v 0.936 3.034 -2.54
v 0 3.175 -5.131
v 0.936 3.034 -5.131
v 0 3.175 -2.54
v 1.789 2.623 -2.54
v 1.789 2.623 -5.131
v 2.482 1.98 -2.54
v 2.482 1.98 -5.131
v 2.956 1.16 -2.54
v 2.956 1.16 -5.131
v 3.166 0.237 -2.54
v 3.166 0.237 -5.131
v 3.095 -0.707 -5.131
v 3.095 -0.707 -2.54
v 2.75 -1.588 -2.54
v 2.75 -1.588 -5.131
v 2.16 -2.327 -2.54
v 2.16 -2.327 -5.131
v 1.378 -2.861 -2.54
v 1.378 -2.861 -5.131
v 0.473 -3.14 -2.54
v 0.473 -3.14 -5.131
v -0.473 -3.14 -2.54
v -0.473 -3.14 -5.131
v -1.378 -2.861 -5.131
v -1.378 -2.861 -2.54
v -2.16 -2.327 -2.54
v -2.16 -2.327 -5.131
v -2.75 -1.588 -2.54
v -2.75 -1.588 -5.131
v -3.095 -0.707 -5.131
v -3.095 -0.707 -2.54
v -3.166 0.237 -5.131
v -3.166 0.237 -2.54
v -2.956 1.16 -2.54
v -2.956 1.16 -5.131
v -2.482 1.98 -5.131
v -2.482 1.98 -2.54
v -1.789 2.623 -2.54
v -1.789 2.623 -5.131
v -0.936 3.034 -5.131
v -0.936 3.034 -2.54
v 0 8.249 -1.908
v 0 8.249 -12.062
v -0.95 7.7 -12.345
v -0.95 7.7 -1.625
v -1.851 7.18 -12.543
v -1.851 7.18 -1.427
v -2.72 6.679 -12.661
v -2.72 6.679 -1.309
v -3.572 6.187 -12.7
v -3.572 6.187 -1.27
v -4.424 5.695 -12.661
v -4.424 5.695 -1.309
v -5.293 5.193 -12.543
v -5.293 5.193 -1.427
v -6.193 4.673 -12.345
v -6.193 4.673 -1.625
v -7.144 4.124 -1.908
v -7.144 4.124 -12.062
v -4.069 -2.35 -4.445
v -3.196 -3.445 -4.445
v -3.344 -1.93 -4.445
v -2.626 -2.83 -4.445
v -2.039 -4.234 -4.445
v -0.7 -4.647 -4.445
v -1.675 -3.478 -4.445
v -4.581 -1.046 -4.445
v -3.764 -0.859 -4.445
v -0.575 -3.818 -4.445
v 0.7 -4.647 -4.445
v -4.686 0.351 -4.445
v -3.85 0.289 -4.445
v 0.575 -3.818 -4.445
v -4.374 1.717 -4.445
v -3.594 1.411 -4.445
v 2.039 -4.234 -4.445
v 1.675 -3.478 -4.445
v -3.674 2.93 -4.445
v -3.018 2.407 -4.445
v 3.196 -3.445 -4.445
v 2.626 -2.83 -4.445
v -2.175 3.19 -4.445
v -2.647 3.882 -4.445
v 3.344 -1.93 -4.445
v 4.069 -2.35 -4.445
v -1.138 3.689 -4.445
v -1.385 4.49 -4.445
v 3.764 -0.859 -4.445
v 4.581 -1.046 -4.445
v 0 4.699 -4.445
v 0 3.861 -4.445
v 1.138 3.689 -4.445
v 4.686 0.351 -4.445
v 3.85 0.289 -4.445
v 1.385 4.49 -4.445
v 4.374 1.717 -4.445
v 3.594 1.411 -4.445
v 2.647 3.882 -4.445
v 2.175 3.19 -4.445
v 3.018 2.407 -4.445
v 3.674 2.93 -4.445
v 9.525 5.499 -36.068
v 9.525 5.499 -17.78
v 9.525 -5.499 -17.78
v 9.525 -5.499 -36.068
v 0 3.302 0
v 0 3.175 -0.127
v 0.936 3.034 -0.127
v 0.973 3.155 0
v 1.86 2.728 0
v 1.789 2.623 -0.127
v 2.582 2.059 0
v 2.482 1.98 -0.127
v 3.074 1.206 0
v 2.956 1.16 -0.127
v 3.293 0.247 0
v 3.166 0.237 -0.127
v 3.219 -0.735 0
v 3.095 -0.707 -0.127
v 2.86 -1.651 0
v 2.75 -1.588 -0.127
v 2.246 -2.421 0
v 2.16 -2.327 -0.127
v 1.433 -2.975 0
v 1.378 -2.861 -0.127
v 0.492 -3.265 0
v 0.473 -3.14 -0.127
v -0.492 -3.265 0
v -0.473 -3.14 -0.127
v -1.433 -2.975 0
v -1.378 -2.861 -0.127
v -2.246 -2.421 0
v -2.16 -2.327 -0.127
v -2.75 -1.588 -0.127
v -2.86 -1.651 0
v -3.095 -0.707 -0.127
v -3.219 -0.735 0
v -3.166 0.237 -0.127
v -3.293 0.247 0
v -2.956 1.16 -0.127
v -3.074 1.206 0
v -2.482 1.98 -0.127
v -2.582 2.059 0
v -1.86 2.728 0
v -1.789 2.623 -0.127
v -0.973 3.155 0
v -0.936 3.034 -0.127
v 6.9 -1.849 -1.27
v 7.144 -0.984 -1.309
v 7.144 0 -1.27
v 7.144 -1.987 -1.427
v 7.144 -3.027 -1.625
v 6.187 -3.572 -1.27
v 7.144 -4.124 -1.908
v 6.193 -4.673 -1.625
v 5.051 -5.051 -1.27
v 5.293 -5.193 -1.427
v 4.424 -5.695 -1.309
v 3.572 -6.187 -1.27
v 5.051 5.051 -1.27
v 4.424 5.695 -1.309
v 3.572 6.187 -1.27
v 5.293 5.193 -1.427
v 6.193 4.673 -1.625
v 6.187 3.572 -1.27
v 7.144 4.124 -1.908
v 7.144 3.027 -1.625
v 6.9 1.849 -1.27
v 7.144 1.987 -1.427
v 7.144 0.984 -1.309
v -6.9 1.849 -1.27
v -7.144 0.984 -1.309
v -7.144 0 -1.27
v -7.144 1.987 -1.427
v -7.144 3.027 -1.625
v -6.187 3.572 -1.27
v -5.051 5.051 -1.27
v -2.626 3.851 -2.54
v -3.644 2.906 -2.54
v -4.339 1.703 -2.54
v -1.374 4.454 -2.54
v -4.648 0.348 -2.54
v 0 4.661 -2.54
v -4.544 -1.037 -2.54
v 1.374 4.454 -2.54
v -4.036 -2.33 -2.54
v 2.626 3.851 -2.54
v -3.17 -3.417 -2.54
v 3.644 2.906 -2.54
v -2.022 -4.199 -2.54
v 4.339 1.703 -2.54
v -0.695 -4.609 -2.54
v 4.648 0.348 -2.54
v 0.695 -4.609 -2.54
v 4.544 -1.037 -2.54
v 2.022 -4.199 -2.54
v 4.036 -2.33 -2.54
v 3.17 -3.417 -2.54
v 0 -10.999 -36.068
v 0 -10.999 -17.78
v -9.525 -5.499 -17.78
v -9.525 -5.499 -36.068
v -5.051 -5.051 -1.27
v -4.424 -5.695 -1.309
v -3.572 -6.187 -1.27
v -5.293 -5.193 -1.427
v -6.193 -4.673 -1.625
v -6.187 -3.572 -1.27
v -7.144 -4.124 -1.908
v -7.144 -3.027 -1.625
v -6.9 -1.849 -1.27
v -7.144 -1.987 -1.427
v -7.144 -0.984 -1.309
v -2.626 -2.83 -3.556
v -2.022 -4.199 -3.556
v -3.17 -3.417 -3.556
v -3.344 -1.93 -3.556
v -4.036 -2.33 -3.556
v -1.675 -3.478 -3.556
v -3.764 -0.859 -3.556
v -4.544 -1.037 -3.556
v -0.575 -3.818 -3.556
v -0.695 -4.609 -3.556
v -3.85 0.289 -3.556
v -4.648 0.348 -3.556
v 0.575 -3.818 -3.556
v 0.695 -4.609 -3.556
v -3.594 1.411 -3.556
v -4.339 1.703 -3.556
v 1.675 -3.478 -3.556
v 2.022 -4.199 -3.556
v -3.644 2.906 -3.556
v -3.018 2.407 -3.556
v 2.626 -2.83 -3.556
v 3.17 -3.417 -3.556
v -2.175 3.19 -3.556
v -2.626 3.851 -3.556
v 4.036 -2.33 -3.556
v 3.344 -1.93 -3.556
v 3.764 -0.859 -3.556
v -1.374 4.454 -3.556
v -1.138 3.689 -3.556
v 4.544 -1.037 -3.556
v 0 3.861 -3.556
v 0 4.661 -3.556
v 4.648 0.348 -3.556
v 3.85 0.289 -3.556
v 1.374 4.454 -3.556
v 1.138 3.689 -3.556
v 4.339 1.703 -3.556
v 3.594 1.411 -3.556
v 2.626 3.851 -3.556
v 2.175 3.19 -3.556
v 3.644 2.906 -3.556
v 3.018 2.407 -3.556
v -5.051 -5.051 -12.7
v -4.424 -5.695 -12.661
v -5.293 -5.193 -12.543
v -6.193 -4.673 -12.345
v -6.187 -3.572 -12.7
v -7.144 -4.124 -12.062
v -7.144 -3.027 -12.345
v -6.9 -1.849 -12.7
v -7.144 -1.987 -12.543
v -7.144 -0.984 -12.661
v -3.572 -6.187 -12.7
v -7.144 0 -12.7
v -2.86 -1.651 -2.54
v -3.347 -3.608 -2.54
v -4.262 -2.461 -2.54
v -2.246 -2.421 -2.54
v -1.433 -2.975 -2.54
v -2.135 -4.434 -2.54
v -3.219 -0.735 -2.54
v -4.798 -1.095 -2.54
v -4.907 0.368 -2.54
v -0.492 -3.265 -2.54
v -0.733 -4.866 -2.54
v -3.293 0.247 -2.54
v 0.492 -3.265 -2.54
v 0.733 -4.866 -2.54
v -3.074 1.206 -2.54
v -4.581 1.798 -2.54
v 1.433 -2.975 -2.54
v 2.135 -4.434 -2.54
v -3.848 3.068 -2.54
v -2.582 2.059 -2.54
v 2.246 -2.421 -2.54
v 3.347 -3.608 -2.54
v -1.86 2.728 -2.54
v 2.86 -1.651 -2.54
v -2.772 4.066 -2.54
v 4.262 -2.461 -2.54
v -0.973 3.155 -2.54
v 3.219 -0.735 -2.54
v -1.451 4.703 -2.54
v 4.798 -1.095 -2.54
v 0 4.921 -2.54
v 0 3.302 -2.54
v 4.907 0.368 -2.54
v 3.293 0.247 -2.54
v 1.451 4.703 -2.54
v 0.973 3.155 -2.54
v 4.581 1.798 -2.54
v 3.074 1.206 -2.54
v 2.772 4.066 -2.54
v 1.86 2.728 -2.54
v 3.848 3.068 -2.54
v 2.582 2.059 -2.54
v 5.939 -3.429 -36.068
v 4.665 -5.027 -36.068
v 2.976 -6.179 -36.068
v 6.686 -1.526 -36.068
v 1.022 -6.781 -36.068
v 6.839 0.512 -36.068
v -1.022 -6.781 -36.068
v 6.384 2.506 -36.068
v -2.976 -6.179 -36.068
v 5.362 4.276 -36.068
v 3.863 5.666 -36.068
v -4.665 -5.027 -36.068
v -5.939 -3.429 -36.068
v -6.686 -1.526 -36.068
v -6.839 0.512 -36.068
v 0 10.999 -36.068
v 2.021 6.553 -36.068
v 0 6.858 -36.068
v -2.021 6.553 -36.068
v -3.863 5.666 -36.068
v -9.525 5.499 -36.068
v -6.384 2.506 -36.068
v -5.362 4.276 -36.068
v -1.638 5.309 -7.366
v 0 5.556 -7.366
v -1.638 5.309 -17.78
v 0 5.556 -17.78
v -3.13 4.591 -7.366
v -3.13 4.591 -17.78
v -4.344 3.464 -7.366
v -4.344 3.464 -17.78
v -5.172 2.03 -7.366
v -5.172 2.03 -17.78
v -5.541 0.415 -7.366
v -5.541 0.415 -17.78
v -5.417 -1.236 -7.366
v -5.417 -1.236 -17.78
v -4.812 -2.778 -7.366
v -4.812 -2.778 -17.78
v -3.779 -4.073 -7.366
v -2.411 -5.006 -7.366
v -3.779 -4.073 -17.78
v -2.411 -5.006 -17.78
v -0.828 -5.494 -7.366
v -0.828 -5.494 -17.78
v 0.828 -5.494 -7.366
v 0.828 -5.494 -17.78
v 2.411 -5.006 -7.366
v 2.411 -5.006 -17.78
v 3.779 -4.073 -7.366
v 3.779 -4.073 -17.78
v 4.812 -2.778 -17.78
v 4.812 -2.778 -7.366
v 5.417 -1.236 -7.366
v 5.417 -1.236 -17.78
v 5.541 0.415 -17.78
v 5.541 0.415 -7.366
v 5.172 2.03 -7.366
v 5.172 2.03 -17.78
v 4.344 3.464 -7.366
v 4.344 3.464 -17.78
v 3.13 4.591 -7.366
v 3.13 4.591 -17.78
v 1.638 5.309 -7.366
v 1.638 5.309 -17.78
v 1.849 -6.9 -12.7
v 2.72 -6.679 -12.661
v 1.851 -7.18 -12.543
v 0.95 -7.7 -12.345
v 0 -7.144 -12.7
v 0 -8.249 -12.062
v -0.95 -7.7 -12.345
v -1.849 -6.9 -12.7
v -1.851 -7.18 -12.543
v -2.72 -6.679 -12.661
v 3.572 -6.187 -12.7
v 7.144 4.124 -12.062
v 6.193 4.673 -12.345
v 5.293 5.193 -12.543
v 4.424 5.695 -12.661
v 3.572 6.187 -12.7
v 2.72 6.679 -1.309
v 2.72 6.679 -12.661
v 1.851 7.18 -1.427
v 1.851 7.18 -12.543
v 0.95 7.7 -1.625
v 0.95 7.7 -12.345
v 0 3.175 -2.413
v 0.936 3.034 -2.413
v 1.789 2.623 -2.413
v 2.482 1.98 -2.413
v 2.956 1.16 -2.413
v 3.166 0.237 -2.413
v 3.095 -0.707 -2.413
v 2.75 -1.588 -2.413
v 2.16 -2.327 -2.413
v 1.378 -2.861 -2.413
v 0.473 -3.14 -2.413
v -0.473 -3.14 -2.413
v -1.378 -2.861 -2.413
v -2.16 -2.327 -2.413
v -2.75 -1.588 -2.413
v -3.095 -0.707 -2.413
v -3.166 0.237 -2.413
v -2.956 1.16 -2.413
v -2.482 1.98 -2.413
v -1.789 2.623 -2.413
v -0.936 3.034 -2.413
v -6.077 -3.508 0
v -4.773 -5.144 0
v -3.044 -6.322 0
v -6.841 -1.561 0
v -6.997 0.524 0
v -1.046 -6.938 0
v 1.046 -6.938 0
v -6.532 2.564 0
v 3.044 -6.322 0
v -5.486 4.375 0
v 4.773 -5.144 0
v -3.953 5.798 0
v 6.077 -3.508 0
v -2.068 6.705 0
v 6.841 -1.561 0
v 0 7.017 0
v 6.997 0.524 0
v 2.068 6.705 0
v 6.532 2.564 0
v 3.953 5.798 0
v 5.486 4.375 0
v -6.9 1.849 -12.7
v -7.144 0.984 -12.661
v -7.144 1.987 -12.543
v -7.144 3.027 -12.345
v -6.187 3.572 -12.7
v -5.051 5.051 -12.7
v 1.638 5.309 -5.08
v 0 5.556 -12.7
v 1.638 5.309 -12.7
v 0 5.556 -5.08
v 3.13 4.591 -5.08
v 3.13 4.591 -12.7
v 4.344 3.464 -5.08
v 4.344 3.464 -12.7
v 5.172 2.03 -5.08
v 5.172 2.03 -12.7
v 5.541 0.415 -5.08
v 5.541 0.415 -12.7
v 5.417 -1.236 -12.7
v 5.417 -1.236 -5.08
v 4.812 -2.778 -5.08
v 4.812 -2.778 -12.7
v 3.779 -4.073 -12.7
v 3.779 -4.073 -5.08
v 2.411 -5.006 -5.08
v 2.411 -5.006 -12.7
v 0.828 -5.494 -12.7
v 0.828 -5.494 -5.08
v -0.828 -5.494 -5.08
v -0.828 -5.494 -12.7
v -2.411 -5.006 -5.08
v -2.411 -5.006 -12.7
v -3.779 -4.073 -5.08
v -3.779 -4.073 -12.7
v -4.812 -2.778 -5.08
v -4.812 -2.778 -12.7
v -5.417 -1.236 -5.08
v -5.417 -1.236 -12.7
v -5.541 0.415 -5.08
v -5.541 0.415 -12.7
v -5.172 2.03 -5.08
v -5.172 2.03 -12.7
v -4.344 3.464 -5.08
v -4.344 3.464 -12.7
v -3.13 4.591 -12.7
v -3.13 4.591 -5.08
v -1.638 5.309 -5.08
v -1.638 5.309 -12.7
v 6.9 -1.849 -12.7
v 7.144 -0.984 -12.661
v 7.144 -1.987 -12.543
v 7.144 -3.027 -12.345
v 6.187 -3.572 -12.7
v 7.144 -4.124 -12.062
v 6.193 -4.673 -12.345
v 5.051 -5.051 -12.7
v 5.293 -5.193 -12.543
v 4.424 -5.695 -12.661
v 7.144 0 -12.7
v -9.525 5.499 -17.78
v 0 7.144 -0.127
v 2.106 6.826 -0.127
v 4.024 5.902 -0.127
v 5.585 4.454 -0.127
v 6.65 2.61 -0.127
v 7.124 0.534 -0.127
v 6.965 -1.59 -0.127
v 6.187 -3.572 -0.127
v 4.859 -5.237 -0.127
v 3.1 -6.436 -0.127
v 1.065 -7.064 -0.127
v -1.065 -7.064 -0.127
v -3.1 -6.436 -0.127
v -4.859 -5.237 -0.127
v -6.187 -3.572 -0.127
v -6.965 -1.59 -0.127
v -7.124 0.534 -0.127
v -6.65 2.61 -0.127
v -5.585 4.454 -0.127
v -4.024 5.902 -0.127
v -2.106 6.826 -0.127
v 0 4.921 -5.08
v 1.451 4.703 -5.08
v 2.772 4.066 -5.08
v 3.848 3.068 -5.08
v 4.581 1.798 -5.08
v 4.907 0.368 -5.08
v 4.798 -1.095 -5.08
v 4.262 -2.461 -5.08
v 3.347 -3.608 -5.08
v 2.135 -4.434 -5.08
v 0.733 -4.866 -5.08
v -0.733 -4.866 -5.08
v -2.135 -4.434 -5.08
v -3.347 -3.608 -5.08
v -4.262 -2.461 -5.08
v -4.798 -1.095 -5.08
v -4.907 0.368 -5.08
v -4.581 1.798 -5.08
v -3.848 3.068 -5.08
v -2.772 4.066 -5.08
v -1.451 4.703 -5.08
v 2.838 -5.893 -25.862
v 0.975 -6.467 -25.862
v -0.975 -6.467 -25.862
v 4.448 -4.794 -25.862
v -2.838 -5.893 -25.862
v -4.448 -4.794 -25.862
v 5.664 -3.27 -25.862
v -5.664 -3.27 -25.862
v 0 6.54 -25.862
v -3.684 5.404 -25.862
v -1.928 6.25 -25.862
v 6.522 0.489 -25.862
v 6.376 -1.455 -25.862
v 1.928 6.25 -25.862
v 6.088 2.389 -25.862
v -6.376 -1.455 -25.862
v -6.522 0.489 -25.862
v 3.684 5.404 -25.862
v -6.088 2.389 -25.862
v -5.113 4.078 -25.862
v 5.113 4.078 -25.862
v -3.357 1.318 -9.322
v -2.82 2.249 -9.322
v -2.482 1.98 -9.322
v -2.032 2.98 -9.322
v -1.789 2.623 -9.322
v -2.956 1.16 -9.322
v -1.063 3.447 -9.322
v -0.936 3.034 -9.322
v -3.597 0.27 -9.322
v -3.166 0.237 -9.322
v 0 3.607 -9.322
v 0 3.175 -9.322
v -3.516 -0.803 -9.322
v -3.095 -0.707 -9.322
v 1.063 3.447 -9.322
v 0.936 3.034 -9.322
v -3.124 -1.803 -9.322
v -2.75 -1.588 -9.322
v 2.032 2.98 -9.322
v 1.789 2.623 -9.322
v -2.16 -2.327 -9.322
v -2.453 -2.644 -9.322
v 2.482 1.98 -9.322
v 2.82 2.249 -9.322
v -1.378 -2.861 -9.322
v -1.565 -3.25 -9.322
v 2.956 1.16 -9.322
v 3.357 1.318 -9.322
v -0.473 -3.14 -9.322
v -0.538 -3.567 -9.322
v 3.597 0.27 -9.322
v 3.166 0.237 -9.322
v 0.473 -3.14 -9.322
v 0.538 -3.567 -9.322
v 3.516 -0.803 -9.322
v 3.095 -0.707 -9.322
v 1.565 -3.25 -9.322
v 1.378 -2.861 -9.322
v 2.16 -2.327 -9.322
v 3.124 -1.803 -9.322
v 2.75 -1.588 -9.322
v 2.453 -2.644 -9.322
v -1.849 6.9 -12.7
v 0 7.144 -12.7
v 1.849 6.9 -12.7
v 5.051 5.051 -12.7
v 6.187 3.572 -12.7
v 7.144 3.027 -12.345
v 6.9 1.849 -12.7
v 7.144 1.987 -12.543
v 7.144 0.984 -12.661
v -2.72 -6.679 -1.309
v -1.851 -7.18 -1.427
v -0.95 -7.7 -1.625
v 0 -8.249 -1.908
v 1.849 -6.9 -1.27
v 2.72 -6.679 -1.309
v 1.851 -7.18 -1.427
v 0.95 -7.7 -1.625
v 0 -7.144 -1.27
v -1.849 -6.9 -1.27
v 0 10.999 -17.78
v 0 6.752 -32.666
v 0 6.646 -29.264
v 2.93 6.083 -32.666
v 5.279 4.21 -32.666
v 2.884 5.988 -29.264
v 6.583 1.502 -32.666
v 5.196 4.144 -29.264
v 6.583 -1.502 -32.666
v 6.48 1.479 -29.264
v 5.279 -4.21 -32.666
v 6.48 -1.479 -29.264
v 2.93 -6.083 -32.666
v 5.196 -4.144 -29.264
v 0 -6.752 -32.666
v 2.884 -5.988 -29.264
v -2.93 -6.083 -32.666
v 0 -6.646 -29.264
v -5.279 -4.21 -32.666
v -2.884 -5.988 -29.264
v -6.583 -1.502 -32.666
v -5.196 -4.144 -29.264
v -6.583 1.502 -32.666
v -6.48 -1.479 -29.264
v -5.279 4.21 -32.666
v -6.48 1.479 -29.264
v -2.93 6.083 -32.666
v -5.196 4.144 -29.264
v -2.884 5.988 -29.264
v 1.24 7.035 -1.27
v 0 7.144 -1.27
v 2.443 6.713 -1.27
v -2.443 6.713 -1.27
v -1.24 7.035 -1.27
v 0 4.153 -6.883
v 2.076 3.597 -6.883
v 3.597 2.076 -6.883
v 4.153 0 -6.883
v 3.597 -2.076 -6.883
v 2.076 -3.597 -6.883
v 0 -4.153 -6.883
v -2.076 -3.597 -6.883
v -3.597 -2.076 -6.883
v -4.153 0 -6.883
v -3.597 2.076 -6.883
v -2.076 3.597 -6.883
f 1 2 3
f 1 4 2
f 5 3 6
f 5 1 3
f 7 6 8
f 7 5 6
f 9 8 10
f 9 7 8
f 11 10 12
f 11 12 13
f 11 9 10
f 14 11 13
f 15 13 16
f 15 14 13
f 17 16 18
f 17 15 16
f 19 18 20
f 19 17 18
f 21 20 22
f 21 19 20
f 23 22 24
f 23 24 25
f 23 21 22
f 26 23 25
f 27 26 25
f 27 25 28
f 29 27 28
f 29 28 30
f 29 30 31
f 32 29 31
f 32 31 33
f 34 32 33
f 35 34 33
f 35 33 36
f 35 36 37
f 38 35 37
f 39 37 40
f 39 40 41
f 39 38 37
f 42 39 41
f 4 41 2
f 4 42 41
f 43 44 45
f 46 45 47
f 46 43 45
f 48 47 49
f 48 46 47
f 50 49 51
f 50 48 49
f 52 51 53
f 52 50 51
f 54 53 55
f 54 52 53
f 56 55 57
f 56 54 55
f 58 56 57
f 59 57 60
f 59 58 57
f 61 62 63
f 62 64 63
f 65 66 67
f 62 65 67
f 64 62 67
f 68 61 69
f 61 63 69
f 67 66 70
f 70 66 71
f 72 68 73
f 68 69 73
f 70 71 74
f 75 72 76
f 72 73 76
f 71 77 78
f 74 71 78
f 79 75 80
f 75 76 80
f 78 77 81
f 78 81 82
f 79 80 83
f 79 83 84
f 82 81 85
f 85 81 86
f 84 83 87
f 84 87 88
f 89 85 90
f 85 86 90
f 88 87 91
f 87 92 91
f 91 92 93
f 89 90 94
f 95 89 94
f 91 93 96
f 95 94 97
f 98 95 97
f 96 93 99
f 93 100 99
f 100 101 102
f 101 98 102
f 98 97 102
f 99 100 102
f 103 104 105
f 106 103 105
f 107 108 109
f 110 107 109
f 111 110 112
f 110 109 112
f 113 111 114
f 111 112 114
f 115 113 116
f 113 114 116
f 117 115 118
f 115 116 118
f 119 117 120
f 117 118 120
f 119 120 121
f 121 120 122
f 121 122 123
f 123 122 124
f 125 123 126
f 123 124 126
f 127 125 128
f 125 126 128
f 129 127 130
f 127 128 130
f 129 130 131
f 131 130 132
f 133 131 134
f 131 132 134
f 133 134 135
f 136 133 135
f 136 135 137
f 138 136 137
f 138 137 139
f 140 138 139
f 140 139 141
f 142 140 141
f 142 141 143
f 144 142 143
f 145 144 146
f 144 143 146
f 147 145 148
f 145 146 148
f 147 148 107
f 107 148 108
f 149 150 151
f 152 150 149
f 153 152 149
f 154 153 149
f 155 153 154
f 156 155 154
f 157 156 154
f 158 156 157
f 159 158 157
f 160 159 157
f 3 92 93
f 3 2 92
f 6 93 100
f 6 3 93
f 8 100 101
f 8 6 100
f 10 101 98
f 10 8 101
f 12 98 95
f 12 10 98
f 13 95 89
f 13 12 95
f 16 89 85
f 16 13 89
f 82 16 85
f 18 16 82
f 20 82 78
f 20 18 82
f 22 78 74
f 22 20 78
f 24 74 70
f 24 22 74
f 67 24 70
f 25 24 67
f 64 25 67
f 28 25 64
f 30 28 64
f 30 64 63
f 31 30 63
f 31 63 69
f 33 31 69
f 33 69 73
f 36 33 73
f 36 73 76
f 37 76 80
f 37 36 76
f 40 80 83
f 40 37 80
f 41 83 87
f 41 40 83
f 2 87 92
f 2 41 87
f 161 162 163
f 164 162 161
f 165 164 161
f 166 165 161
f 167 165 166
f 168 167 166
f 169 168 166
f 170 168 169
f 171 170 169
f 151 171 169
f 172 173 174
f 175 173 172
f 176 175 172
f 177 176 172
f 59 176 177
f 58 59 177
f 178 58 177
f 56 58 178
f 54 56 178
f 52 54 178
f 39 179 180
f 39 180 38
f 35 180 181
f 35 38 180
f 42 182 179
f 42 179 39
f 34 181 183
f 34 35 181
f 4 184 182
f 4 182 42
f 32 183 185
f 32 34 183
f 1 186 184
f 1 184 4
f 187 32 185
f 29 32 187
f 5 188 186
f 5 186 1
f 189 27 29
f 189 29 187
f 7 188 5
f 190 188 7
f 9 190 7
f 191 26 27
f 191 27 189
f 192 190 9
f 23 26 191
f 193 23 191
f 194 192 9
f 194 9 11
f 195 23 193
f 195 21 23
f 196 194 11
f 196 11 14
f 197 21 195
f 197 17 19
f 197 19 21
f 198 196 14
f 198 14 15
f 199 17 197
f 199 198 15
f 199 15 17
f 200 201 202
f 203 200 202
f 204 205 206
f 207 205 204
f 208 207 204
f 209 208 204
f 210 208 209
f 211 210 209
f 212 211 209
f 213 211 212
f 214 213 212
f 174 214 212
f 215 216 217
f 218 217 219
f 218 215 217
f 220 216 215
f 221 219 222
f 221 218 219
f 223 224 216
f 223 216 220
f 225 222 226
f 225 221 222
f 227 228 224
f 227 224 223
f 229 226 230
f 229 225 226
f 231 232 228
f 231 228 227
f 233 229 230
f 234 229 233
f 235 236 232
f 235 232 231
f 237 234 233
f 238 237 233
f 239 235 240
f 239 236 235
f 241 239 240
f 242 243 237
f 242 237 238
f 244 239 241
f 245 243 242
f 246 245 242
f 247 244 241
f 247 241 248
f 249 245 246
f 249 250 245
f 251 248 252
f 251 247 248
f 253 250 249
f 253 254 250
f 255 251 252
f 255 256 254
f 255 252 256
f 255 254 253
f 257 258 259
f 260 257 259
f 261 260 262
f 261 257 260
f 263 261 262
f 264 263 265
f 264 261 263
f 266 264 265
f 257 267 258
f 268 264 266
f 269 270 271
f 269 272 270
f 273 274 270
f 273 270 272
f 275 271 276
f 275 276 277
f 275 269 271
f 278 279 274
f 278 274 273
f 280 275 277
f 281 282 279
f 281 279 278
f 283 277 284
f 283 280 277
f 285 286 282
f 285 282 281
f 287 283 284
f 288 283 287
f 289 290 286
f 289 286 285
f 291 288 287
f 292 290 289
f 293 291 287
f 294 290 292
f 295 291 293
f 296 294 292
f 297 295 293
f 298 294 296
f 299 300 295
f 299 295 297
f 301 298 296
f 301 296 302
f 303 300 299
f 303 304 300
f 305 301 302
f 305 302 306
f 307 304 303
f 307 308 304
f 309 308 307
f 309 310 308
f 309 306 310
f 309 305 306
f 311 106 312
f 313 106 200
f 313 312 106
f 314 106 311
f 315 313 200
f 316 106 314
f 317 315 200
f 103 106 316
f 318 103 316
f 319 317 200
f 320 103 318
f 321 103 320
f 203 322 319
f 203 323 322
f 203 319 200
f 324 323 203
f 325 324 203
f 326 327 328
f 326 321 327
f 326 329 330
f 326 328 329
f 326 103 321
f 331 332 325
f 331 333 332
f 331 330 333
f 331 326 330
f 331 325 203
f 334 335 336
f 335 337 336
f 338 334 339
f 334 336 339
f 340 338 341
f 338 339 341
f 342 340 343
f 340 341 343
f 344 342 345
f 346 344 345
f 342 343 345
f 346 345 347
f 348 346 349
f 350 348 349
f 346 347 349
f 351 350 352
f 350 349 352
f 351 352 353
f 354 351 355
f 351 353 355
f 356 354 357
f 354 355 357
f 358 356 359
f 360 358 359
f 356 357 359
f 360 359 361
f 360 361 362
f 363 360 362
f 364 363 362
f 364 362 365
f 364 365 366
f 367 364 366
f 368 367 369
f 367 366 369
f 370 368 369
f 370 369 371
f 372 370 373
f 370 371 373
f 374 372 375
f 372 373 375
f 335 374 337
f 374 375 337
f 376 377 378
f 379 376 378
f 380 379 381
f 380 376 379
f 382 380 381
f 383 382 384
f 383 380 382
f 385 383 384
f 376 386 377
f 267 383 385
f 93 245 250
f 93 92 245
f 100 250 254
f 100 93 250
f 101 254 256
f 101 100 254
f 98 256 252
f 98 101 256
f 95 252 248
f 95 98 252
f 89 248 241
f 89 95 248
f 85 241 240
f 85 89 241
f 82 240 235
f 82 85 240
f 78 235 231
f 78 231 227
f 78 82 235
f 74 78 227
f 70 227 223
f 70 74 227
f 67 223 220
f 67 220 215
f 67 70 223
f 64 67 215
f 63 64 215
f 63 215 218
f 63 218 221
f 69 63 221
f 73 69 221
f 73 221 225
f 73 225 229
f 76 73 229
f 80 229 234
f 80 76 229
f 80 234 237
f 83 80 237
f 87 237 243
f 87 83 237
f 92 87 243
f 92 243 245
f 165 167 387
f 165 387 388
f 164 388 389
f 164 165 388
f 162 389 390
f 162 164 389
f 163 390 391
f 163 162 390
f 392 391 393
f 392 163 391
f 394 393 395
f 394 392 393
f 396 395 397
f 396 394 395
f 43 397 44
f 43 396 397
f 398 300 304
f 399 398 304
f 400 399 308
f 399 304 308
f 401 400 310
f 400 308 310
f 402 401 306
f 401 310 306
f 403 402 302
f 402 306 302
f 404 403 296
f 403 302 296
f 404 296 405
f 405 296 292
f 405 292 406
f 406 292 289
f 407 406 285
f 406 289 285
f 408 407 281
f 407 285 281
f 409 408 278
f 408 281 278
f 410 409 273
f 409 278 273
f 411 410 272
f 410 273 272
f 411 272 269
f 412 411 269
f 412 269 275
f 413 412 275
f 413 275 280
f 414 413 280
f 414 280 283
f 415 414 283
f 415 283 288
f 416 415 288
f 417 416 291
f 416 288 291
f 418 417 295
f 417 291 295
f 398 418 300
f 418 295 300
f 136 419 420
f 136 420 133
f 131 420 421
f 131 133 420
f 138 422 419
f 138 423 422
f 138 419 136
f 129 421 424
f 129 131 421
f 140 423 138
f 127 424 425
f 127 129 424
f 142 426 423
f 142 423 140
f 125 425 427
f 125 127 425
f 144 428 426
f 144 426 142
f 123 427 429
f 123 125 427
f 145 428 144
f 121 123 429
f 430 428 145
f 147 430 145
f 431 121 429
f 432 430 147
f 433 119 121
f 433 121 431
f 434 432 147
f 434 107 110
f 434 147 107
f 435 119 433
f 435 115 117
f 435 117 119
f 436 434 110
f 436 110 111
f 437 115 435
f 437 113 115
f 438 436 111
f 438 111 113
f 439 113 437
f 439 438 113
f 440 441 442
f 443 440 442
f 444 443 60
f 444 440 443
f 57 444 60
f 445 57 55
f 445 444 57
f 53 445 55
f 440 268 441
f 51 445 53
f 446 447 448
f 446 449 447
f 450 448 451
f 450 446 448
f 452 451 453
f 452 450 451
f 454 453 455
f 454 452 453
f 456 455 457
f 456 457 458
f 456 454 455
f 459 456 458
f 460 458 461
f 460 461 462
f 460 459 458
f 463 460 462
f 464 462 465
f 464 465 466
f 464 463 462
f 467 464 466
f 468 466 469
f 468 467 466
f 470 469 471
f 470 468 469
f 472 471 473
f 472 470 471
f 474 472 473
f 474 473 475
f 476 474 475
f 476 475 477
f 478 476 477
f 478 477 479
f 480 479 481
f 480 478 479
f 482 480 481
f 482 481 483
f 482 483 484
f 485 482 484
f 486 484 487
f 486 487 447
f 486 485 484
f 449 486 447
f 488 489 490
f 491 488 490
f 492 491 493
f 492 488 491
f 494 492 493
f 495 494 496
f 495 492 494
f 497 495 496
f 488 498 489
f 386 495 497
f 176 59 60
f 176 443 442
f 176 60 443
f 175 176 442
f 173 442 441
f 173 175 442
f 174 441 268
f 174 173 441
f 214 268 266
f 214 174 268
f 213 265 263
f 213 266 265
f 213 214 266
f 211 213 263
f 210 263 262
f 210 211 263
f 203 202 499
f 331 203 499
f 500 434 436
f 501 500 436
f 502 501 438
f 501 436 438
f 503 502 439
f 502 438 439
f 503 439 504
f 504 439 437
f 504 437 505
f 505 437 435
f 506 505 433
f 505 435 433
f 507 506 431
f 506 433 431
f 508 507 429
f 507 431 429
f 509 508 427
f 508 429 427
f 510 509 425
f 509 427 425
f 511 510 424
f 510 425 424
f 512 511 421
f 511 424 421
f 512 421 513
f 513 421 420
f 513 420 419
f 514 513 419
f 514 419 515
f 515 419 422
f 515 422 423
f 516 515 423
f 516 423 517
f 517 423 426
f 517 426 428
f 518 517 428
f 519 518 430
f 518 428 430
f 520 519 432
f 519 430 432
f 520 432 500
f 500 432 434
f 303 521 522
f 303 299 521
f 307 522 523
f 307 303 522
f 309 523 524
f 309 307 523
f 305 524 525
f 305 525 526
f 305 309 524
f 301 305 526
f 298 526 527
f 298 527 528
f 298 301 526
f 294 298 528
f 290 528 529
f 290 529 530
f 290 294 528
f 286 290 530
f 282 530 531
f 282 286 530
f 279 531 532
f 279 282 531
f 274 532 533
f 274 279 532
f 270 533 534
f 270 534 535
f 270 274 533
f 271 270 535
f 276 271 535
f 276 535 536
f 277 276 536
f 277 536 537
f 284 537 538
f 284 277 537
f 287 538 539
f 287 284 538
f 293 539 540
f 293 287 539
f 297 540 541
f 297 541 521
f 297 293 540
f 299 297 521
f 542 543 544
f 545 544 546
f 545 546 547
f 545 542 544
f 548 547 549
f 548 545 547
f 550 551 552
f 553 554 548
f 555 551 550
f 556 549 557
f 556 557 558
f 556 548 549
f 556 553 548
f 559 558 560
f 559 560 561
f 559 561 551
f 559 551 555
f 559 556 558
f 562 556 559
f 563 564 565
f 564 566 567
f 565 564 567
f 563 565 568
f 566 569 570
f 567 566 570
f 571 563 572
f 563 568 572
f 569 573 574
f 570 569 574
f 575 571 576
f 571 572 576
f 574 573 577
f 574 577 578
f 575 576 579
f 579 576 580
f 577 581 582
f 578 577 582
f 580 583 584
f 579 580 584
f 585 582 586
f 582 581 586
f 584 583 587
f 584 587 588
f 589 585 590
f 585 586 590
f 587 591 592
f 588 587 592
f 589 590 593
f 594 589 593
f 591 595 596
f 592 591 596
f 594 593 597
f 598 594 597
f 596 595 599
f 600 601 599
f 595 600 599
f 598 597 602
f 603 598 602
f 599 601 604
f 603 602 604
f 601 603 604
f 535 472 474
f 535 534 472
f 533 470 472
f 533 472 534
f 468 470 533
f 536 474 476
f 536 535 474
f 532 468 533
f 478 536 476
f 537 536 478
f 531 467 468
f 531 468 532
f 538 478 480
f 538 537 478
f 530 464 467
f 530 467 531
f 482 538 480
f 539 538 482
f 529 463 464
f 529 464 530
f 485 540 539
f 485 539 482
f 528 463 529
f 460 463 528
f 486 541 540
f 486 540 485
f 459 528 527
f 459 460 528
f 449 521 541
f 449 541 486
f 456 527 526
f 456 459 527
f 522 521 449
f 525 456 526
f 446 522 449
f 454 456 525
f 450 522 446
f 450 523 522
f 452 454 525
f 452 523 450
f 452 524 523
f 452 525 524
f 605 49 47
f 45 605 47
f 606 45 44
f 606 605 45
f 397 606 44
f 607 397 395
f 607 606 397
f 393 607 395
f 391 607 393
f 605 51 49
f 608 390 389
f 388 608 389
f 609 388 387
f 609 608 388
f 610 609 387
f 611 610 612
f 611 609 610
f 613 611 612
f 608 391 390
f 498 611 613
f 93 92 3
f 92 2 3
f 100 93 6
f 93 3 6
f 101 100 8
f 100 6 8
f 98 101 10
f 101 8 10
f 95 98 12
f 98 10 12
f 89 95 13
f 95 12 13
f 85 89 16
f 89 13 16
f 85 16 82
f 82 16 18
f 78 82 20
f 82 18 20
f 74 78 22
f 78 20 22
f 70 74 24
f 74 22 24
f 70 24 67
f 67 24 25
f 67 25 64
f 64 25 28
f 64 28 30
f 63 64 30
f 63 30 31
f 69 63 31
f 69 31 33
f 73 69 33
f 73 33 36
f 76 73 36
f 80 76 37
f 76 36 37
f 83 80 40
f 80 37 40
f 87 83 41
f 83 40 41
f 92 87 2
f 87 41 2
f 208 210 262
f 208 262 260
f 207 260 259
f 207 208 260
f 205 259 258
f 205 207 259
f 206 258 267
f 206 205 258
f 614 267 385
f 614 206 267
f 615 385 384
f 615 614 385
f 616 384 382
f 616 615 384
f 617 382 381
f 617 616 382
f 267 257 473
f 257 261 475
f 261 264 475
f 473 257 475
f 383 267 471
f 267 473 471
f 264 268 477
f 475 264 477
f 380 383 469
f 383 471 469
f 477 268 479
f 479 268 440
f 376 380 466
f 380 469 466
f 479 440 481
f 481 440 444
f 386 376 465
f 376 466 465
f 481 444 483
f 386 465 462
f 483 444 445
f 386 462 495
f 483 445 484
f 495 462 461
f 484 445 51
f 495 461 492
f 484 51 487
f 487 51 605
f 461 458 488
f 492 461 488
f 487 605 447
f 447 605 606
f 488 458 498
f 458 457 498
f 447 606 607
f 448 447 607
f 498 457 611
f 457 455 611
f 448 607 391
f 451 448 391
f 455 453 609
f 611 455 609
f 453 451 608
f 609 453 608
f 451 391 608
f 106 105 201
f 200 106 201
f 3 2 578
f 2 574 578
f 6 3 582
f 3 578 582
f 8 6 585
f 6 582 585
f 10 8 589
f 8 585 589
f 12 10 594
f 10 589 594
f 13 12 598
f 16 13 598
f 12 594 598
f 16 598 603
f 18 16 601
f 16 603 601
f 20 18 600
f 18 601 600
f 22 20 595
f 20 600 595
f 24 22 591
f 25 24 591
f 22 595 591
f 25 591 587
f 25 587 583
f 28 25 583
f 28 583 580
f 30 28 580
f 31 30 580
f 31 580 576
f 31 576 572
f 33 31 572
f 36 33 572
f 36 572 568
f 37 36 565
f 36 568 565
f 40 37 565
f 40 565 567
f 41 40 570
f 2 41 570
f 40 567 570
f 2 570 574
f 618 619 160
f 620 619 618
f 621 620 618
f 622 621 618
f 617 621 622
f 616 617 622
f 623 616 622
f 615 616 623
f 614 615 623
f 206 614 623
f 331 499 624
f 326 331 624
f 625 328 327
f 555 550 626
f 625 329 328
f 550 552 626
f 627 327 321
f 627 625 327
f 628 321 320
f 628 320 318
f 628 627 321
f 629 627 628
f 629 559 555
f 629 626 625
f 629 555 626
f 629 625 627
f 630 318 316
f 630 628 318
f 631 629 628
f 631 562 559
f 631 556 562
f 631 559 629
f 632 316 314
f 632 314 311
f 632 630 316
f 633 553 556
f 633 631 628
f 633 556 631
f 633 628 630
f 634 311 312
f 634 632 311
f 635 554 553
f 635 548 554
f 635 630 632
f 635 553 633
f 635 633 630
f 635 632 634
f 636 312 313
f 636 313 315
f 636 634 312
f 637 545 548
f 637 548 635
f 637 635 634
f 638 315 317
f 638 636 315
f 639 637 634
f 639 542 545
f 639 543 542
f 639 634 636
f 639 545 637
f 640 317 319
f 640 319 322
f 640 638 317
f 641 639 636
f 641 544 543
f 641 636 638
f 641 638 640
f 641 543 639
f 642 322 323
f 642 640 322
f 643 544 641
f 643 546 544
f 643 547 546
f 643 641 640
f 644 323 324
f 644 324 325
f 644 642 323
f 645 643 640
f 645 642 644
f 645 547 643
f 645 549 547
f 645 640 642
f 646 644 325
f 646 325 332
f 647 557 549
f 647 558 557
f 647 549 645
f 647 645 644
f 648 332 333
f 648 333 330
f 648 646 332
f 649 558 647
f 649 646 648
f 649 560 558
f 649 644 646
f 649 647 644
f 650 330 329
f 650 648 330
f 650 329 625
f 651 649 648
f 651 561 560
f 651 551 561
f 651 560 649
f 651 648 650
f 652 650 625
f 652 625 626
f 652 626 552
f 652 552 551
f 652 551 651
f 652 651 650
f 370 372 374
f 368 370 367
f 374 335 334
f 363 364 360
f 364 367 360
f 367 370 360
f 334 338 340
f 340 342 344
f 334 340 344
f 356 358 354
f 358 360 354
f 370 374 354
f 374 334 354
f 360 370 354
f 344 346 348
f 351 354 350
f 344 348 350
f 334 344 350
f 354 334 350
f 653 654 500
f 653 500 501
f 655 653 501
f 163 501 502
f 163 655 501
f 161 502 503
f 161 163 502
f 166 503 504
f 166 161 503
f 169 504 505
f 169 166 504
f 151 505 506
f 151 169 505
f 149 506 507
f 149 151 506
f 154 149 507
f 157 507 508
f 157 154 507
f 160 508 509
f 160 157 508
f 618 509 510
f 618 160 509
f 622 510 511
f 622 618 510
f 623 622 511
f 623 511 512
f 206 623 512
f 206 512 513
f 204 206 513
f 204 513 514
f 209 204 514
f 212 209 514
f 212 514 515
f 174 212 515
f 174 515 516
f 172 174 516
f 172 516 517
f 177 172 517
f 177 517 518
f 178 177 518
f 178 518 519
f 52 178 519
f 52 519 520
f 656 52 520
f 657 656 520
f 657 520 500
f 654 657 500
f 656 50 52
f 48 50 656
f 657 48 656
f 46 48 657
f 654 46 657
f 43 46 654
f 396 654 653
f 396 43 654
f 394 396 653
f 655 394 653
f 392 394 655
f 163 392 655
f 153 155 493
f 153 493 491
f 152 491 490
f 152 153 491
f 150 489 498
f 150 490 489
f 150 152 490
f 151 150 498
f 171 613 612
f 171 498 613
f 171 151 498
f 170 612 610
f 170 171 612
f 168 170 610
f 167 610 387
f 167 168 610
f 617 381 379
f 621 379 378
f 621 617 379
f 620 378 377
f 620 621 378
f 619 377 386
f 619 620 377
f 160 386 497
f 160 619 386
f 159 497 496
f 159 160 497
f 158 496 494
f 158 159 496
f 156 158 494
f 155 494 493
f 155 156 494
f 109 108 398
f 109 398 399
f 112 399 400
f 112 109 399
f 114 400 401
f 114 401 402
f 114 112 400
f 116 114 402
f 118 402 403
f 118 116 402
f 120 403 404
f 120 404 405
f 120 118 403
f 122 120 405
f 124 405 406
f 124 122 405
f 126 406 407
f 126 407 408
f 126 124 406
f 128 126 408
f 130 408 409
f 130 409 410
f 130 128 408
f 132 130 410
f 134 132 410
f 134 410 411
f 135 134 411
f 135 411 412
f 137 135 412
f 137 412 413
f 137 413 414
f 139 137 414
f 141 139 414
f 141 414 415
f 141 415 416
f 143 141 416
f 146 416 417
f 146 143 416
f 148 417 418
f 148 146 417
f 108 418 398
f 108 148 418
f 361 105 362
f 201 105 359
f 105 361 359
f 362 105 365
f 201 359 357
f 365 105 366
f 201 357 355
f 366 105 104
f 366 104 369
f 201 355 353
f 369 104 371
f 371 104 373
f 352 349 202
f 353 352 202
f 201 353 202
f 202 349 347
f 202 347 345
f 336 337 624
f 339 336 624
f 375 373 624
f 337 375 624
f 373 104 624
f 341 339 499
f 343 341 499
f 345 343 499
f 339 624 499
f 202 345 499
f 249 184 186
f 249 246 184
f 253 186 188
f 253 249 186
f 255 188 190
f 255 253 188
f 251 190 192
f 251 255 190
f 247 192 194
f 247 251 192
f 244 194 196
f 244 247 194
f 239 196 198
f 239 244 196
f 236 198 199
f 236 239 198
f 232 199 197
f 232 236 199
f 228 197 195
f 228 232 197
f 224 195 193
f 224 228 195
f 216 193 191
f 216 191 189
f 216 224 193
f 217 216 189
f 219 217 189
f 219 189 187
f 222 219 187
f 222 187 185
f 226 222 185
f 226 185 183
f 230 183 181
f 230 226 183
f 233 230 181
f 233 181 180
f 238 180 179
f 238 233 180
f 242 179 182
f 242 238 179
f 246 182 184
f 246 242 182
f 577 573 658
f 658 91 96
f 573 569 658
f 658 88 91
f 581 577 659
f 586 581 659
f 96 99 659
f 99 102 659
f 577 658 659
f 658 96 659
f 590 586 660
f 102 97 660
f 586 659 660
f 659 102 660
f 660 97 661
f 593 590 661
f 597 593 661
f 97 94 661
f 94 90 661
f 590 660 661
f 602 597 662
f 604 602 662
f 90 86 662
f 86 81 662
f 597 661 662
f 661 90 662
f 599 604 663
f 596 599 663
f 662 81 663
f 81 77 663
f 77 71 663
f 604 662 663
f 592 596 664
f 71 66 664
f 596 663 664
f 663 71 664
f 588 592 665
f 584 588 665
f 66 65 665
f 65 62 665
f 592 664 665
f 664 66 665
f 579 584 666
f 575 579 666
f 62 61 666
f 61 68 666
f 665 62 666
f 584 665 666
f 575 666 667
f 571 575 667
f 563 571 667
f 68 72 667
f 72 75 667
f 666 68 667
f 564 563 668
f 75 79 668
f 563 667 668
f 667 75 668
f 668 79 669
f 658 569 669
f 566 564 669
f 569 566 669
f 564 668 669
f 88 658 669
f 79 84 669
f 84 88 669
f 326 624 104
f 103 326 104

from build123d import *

# Parameters (mm, degrees)
BOSS_EXTRUDE1_DEPTH = 12.7
CHAMFER1_SIZE       = 0.127
SKETCH4_W           = 10.414
SKETCH4_H           = 5.55625
BOSS_EXTRUDE2_DEPTH = 18.288


with BuildPart() as part:
    # Sketch2 → Boss-Extrude1 (new body)
    with BuildSketch(Plane.XY):
        Polygon((0, 8.248891971), (-7.14375, 4.124445986), (-7.14375, -4.124445986), (0, -8.248891971), (7.14375, -4.124445986), (7.14375, 4.124445986), align=None)
    extrude(amount=-BOSS_EXTRUDE1_DEPTH)

    # Sketch3 → Cut-Revolve1 (revolve, cut)
    with BuildSketch(Plane(origin=(0, 0, 0), x_dir=(0, 0, -1), z_dir=(1, 0, 0))):
        Polygon((0, 8.248891971), (0, 7.14375), (1.27, 7.14375), (1.908054014, 8.248891971), (12.061945986, 8.248891971), (12.7, 7.14375), (12.7, 8.248891971), (12.7, 9.354033942), (0, 9.354033942), align=None)
        Polygon((0, 3.175), (0, 0), (12.7, 0), (12.7, 5.55625), (5.08, 5.55625), (5.08, 4.92125), (2.54, 4.92125), (2.54, 4.28625), (2.54, 3.175), align=None)
    revolve(axis=Axis((0, 0, 0), (0, 0, -1)), mode=Mode.SUBTRACT)

    # Chamfer1
    chamfer1_edges = [part.edges().sort_by_distance(p)[0] for p in [
        (0, -7.14375, 0),
        (0, -3.175, -2.54),
        (0, -3.175, 0),
    ]]
    chamfer(chamfer1_edges, length=CHAMFER1_SIZE)


with BuildPart() as body_2:
    # Sketch4 → Revolve1 (revolve)
    with BuildSketch(Plane(origin=(0, 0, 0), x_dir=(0, 0, -1), z_dir=(1, 0, 0))):
        with Locations((12.573, 2.778125)):
            Rectangle(SKETCH4_W, SKETCH4_H)
    revolve(axis=Axis((0, 0, -17.78), (0, 0, 1)))

    # Sketch7 → Boss-Extrude2 (add)
    with BuildSketch(Plane(origin=(0, 0, -17.78), x_dir=(-1, 0, 0), z_dir=(0, 0, -1))):
        Polygon((0, 10.998522628), (-9.525, 5.499261314), (-9.525, -5.499261314), (0, -10.998522628), (9.525, -5.499261314), (9.525, 5.499261314), align=None)
    extrude(amount=BOSS_EXTRUDE2_DEPTH)


with BuildPart() as body_3:
    # Sketch9 → Revolve2 (revolve)
    with BuildSketch(Plane(origin=(0, 0, 0), x_dir=(0, 0, -1), z_dir=(1, 0, 0))):
        Polygon((4.445, 4.699), (4.445, 3.8608), (5.1308, 3.175), (9.3218, 3.175), (9.3218, 3.6068), align=None)
    revolve(axis=Axis((0, 0, 0), (0, 0, -1)))


with BuildPart() as body_4:
    # Sketch10 → Revolve3 (revolve)
    with BuildSketch(Plane(origin=(0, 0, 0), x_dir=(0, 0, -1), z_dir=(1, 0, 0))):
        Polygon((2.54, 4.6609), (3.556, 4.6609), (3.556, 3.8608), (4.445, 3.8608), (5.1308, 3.175), (2.54, 3.175), align=None)
    revolve(axis=Axis((0, 0, 0), (0, 0, -1)))


with BuildPart() as body_5:
    # Sketch11 → Revolve4 (revolve)
    with BuildSketch(Plane(origin=(0, 0, 0), x_dir=(0, 0, -1), z_dir=(1, 0, 0))):
        Polygon((25.86228, 0), (36.068, 0), (36.068, 6.858), (25.86228, 6.540243957), align=None)
    revolve(axis=Axis((0, 0, -25.86228), (0, 0, -1)))


with BuildPart() as body_2_1:
    add(body_2.part)

    # Combine1: cut body 5
    add(body_5.part, mode=Mode.SUBTRACT)


solid = Compound([part.part, body_3.part, body_4.part, body_2_1.part])
